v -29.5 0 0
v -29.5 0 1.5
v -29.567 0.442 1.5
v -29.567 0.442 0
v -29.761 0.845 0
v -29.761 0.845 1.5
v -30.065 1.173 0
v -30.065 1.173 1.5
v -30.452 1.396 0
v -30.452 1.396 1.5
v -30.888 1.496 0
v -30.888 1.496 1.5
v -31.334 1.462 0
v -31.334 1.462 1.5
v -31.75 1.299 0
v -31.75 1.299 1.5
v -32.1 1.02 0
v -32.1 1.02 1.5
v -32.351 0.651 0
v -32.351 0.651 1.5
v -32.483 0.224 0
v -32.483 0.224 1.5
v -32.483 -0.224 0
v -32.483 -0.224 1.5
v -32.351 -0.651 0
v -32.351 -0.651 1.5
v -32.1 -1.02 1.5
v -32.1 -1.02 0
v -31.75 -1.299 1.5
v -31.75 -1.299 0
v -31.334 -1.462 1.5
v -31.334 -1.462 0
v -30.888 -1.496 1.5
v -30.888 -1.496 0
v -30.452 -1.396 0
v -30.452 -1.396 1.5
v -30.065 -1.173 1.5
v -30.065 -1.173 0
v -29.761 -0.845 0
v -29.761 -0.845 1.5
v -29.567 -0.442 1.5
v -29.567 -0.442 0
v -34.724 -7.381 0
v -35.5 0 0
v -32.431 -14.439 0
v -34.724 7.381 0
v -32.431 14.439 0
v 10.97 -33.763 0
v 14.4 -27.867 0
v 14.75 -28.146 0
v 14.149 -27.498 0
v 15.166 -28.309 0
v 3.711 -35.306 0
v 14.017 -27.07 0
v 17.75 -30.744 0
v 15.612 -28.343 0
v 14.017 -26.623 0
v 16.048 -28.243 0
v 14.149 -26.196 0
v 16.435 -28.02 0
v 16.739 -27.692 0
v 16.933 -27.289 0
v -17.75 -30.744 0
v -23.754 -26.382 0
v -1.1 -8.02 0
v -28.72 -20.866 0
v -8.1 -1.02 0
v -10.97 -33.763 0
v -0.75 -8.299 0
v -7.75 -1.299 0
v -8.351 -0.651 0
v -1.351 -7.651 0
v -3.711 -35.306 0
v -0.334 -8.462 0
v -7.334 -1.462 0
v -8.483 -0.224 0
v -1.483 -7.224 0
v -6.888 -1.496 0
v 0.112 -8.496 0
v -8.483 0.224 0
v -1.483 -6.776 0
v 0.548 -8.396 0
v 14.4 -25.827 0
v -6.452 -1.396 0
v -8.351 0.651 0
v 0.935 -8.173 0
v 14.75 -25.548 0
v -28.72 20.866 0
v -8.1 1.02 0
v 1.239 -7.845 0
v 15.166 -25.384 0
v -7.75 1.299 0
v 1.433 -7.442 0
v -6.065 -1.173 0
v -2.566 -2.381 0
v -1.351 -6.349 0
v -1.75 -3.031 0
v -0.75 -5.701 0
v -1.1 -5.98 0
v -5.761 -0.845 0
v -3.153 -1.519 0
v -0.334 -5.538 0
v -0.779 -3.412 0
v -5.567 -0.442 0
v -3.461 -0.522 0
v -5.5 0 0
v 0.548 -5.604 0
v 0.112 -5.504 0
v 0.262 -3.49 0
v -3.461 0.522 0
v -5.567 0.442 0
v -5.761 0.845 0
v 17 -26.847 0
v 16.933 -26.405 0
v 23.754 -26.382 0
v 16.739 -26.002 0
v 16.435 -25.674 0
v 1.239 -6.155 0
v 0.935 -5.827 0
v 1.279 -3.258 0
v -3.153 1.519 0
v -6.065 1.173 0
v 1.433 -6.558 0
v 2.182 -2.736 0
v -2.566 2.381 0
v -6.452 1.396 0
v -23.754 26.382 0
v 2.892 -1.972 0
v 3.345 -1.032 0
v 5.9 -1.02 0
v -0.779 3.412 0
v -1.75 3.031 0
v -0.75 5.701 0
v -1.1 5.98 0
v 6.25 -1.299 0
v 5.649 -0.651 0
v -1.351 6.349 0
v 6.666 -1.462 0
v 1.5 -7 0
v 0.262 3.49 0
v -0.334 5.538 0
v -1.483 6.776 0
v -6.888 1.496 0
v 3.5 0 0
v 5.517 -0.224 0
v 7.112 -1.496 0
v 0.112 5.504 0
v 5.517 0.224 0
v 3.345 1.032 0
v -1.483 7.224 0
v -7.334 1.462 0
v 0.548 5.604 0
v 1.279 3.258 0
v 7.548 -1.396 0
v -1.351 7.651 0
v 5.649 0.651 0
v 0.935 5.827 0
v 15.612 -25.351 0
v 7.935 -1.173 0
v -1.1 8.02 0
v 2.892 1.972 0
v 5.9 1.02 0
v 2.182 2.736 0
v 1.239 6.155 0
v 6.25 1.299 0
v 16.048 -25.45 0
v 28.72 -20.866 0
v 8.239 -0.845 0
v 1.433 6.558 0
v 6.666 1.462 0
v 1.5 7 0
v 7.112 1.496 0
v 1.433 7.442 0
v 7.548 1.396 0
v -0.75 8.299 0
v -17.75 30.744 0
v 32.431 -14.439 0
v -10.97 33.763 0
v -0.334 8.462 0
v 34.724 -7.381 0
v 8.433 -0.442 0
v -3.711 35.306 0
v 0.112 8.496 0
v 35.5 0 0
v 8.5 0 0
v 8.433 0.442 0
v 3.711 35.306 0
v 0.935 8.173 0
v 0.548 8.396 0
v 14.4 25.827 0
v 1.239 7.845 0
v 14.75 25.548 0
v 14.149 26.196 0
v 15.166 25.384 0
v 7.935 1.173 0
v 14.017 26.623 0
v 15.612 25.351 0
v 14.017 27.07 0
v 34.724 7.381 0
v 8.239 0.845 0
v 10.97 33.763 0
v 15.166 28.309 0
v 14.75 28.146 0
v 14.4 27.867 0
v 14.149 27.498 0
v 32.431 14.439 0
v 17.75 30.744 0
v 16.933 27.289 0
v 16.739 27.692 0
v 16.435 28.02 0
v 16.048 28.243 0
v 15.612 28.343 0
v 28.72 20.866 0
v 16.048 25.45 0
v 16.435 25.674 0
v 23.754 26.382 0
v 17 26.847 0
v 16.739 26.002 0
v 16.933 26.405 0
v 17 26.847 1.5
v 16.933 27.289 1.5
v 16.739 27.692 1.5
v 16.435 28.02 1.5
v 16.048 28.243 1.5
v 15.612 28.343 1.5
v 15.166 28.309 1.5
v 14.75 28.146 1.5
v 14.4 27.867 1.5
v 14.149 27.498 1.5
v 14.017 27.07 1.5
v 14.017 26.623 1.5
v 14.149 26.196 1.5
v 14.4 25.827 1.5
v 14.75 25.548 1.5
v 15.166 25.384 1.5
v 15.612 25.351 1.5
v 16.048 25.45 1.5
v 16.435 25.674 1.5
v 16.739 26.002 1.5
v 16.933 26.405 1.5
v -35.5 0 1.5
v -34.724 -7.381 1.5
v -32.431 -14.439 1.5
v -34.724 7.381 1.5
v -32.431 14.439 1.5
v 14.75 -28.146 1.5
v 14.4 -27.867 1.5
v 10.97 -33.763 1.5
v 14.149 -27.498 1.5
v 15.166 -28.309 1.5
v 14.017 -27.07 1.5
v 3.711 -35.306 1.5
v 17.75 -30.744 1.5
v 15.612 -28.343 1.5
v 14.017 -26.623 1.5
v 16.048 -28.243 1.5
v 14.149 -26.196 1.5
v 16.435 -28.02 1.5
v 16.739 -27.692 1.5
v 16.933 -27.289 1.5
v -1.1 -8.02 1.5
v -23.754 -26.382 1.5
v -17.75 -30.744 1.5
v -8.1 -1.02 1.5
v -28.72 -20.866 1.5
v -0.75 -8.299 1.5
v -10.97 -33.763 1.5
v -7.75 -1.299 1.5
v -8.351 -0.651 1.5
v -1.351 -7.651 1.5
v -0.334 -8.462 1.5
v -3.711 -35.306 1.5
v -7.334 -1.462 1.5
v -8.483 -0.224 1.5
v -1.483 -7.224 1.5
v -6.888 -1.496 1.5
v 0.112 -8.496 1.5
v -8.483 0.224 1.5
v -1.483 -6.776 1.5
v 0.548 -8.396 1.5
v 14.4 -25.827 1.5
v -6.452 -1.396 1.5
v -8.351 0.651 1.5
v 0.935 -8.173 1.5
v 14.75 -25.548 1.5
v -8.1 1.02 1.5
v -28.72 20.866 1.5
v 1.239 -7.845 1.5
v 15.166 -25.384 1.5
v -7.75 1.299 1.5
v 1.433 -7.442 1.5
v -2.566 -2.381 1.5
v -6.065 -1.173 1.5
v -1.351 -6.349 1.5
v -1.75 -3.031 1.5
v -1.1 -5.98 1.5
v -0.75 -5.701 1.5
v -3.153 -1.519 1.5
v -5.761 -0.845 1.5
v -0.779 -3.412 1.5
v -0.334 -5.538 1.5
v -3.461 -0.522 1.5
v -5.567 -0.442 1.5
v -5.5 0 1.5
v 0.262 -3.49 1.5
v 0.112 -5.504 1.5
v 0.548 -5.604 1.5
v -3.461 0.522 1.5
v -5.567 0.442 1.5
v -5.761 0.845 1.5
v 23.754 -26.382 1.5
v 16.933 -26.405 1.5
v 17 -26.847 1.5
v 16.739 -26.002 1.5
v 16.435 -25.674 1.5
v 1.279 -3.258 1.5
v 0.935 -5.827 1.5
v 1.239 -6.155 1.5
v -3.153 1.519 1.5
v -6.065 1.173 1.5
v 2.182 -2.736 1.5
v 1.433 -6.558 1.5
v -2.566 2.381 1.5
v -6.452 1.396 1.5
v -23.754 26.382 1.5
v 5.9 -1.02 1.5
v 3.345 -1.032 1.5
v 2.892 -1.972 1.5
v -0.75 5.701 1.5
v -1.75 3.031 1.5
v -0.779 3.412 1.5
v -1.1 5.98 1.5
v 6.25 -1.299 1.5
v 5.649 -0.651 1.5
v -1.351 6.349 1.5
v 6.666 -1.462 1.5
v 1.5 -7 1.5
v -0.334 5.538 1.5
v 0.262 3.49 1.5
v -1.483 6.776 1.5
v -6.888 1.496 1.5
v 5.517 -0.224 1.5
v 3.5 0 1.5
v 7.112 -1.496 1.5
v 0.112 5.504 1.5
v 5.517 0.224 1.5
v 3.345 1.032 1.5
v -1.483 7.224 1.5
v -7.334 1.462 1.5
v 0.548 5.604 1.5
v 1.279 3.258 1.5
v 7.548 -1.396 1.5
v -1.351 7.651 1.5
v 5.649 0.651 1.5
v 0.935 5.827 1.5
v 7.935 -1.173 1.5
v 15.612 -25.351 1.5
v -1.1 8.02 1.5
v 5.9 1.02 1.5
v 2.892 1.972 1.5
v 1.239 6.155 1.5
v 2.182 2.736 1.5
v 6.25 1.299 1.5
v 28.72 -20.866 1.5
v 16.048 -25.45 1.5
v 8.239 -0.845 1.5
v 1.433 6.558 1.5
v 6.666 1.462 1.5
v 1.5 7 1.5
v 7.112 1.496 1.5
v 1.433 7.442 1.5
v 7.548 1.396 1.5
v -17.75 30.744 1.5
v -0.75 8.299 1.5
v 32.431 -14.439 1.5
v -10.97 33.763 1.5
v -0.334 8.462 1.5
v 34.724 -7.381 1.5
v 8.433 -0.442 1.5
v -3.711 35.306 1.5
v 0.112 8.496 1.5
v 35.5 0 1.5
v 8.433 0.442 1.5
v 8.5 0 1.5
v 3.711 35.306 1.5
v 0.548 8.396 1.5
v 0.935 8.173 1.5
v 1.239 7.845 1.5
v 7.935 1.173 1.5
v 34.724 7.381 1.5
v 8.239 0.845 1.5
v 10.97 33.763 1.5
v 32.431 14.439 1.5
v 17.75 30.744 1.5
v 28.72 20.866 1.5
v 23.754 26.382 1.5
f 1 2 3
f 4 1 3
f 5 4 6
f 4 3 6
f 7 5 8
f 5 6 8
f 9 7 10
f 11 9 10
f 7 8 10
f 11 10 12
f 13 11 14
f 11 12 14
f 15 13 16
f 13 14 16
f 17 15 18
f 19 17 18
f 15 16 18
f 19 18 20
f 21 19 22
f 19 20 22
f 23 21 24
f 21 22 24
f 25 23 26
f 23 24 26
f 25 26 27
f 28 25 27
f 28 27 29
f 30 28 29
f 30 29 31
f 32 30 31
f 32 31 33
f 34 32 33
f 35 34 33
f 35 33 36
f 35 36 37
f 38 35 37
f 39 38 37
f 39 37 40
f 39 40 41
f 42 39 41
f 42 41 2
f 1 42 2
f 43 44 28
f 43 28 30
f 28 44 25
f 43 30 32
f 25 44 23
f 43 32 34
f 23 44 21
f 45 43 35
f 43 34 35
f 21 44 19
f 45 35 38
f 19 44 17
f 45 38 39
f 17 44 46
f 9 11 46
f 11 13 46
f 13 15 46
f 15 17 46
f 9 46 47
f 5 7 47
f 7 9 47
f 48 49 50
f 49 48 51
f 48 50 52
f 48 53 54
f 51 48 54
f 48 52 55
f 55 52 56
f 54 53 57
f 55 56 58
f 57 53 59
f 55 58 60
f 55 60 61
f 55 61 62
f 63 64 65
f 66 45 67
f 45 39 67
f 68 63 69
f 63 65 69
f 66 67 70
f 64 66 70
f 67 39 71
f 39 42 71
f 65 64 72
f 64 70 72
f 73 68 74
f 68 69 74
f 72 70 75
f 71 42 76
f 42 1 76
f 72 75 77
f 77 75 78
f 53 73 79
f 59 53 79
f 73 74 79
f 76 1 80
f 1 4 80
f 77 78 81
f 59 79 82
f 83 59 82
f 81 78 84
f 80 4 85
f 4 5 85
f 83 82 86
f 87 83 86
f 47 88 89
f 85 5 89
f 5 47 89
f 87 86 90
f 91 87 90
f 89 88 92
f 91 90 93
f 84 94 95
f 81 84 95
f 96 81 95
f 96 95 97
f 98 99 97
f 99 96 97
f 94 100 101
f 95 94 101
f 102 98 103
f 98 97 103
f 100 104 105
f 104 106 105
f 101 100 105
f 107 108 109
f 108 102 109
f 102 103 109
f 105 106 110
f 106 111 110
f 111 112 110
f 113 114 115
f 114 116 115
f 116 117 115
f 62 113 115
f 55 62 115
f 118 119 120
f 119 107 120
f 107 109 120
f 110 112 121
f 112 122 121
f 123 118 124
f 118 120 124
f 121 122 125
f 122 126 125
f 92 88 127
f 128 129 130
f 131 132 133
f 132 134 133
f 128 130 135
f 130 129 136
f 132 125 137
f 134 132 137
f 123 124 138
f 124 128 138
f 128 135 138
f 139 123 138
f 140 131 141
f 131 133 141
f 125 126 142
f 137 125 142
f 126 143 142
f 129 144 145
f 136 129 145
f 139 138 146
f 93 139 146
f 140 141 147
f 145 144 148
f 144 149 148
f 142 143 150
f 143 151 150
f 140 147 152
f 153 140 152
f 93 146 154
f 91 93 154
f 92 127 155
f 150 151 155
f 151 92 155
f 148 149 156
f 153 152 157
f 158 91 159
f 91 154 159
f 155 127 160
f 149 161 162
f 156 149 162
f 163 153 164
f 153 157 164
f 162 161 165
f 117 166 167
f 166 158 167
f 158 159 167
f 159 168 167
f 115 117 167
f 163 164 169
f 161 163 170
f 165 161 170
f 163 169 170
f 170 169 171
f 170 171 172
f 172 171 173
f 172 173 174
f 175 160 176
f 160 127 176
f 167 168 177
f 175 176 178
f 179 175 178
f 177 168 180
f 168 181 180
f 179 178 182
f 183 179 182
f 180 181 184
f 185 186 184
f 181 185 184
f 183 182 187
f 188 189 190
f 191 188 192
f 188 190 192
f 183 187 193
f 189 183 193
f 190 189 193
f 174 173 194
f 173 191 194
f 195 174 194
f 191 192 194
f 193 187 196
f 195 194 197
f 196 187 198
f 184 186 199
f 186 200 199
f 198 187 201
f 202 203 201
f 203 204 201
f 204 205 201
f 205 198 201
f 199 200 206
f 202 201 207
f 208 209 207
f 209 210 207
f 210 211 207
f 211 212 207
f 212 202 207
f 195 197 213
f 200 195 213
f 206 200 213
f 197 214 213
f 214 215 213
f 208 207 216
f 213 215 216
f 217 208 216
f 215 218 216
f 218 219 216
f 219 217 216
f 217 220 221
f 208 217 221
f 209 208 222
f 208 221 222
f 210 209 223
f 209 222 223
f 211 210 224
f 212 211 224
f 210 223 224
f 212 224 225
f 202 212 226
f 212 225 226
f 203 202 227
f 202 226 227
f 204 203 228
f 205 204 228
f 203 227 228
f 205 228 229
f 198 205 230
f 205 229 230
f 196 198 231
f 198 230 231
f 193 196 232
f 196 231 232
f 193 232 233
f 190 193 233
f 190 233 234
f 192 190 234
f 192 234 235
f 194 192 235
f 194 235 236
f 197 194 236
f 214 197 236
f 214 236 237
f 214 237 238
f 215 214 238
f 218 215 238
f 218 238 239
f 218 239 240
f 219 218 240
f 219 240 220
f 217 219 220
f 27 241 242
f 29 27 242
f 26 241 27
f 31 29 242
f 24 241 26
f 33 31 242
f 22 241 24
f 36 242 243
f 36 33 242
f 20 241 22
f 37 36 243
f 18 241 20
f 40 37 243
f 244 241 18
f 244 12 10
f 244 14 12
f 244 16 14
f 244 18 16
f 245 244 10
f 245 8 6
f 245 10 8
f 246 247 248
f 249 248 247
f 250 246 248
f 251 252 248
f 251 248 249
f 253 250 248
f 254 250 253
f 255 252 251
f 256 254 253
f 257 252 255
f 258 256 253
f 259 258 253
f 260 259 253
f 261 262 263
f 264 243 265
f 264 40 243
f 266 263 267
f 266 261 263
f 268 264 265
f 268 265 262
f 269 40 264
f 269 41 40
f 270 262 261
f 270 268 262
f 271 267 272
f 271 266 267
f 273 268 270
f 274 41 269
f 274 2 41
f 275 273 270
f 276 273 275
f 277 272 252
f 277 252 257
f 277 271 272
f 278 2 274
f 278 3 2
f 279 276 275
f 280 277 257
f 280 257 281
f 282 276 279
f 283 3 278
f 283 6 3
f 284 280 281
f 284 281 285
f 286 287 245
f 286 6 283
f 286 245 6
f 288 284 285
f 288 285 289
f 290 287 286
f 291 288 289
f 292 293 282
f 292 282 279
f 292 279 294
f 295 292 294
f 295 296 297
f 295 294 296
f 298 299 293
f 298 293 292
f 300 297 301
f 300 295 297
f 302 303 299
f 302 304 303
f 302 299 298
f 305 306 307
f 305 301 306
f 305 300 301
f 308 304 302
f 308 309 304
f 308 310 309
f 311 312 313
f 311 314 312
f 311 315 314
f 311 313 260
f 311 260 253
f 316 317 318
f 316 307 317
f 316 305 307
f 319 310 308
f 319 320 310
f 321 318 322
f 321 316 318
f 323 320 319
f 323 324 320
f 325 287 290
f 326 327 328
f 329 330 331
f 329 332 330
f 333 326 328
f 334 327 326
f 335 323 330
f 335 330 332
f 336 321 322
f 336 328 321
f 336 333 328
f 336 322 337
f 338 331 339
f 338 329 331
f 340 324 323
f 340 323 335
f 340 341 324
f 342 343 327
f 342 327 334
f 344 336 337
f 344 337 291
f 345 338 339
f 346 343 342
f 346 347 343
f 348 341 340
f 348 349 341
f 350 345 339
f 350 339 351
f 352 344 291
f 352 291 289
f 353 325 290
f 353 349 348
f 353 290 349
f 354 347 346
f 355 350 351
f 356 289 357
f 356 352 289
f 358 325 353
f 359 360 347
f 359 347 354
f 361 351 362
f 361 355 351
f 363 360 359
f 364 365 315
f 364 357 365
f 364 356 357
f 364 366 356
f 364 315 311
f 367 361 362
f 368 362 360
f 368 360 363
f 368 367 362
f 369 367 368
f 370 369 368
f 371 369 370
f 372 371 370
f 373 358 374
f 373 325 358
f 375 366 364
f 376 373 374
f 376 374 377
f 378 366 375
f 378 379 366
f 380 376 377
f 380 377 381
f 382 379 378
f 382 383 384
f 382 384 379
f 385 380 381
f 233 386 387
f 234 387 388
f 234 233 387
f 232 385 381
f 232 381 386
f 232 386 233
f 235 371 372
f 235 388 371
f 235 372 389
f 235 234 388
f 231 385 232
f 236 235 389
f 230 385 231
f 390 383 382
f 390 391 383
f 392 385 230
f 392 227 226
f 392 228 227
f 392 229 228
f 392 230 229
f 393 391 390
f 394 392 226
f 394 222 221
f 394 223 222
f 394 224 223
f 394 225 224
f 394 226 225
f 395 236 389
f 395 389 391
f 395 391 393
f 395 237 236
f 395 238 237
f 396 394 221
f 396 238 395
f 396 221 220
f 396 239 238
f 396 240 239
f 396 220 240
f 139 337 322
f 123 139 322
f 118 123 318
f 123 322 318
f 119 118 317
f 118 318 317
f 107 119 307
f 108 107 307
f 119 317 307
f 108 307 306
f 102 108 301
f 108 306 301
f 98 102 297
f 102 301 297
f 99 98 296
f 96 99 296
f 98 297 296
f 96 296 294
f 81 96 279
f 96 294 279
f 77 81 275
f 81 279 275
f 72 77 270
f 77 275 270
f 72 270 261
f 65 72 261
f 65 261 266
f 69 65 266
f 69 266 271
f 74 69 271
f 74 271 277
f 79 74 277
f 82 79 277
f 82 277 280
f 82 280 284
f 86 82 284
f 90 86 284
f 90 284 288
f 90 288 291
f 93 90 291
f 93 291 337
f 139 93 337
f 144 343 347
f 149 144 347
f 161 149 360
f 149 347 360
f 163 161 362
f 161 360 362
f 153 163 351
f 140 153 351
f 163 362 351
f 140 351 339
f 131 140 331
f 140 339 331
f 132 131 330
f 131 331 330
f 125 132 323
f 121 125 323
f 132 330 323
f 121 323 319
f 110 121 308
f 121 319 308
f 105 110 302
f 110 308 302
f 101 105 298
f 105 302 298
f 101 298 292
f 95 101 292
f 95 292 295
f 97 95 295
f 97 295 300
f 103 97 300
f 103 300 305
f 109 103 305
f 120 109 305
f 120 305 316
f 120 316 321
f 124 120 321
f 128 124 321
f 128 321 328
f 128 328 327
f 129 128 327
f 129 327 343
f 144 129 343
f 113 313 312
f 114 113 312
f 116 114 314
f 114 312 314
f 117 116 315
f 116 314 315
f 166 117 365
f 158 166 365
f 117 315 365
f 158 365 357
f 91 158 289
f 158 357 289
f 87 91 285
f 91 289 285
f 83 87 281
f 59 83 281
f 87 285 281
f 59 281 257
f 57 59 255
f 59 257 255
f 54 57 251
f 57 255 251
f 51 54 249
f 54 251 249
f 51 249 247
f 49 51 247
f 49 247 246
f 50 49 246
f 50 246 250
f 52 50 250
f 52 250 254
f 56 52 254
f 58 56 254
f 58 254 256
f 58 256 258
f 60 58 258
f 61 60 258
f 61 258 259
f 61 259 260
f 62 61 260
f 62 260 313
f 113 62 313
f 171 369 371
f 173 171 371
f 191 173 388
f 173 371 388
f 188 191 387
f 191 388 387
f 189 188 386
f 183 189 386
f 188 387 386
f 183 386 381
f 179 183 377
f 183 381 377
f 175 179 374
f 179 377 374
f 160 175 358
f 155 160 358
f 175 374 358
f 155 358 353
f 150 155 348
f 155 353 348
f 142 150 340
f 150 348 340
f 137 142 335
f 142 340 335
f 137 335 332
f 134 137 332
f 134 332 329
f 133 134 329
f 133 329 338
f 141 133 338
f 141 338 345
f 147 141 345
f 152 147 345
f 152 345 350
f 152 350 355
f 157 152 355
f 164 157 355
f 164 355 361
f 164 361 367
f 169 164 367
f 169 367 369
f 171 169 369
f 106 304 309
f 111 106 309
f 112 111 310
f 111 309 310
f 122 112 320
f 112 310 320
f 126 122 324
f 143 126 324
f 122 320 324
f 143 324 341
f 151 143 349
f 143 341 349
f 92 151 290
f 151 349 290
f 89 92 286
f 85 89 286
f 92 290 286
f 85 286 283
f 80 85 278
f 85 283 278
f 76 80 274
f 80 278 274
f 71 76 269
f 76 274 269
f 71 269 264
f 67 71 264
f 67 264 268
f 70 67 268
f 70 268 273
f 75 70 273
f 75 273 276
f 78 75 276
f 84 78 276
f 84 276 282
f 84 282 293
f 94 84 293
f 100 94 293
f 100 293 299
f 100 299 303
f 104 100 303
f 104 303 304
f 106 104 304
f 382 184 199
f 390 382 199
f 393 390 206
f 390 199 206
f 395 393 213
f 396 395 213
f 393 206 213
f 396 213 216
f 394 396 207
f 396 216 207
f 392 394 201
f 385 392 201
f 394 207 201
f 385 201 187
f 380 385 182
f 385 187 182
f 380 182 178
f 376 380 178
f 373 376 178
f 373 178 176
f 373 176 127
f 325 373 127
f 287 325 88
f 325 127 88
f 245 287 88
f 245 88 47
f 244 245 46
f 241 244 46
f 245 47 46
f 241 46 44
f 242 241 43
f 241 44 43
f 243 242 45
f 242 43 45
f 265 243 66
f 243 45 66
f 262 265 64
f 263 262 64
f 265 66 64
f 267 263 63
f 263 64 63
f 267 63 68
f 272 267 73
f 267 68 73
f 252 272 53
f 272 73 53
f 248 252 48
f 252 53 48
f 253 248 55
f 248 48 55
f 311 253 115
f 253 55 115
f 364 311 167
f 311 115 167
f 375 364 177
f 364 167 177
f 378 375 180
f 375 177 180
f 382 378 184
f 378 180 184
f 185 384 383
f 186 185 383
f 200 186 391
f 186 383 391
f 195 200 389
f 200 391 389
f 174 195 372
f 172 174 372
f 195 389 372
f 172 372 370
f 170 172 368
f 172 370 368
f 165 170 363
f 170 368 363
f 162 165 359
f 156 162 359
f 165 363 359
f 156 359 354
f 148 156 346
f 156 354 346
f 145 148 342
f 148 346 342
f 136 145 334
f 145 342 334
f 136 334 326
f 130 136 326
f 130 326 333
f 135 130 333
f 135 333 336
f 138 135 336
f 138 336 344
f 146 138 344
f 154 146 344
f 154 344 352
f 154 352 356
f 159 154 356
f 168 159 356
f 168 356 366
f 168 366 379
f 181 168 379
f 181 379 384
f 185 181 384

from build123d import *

# Parameters (mm, degrees)
SKETCH_1_R          = 35.5
EXTRUDE_1_DEPTH     = 1.5
SKETCH_2_R          = 3.5
CUT_EXTRUDE_1_DEPTH = 2
SKETCH_3_R          = 1.5
CUT_EXTRUDE_2_DEPTH = 2
SKETCH_5_R          = 1.5
CUT_EXTRUDE_3_DEPTH = 2


with BuildPart() as part:
    # 草图1 → 凸台-拉伸1 (new body)
    with BuildSketch(Plane.XY):
        Circle(SKETCH_1_R)
    extrude(amount=EXTRUDE_1_DEPTH)

    # 草图2 → 切除-拉伸1 (cut)
    with BuildSketch(Plane.XY.offset(1.5)):
        Circle(SKETCH_2_R)
    extrude(amount=-CUT_EXTRUDE_1_DEPTH, mode=Mode.SUBTRACT)

    # 草图3 → 切除-拉伸2 (cut)
    with BuildSketch(Plane.XY.offset(1.5)):
        with Locations((0, 7)):
            Circle(SKETCH_3_R)
        with Locations((7, 0)):
            Circle(SKETCH_3_R)
        with Locations((0, -7)):
            Circle(SKETCH_3_R)
        with Locations((-7, 0)):
            Circle(SKETCH_3_R)
    extrude(amount=-CUT_EXTRUDE_2_DEPTH, mode=Mode.SUBTRACT)

    # 草图5 → 切除-拉伸3 (cut)
    with BuildSketch(Plane.XY.offset(1.5)):
        with Locations((-31, 0)):
            Circle(SKETCH_5_R)
        with Locations((15.5, 26.846787517)):
            Circle(SKETCH_5_R)
        with Locations((15.5, -26.846787517)):
            Circle(SKETCH_5_R)
    extrude(amount=-CUT_EXTRUDE_3_DEPTH, mode=Mode.SUBTRACT)


solid = part.part
